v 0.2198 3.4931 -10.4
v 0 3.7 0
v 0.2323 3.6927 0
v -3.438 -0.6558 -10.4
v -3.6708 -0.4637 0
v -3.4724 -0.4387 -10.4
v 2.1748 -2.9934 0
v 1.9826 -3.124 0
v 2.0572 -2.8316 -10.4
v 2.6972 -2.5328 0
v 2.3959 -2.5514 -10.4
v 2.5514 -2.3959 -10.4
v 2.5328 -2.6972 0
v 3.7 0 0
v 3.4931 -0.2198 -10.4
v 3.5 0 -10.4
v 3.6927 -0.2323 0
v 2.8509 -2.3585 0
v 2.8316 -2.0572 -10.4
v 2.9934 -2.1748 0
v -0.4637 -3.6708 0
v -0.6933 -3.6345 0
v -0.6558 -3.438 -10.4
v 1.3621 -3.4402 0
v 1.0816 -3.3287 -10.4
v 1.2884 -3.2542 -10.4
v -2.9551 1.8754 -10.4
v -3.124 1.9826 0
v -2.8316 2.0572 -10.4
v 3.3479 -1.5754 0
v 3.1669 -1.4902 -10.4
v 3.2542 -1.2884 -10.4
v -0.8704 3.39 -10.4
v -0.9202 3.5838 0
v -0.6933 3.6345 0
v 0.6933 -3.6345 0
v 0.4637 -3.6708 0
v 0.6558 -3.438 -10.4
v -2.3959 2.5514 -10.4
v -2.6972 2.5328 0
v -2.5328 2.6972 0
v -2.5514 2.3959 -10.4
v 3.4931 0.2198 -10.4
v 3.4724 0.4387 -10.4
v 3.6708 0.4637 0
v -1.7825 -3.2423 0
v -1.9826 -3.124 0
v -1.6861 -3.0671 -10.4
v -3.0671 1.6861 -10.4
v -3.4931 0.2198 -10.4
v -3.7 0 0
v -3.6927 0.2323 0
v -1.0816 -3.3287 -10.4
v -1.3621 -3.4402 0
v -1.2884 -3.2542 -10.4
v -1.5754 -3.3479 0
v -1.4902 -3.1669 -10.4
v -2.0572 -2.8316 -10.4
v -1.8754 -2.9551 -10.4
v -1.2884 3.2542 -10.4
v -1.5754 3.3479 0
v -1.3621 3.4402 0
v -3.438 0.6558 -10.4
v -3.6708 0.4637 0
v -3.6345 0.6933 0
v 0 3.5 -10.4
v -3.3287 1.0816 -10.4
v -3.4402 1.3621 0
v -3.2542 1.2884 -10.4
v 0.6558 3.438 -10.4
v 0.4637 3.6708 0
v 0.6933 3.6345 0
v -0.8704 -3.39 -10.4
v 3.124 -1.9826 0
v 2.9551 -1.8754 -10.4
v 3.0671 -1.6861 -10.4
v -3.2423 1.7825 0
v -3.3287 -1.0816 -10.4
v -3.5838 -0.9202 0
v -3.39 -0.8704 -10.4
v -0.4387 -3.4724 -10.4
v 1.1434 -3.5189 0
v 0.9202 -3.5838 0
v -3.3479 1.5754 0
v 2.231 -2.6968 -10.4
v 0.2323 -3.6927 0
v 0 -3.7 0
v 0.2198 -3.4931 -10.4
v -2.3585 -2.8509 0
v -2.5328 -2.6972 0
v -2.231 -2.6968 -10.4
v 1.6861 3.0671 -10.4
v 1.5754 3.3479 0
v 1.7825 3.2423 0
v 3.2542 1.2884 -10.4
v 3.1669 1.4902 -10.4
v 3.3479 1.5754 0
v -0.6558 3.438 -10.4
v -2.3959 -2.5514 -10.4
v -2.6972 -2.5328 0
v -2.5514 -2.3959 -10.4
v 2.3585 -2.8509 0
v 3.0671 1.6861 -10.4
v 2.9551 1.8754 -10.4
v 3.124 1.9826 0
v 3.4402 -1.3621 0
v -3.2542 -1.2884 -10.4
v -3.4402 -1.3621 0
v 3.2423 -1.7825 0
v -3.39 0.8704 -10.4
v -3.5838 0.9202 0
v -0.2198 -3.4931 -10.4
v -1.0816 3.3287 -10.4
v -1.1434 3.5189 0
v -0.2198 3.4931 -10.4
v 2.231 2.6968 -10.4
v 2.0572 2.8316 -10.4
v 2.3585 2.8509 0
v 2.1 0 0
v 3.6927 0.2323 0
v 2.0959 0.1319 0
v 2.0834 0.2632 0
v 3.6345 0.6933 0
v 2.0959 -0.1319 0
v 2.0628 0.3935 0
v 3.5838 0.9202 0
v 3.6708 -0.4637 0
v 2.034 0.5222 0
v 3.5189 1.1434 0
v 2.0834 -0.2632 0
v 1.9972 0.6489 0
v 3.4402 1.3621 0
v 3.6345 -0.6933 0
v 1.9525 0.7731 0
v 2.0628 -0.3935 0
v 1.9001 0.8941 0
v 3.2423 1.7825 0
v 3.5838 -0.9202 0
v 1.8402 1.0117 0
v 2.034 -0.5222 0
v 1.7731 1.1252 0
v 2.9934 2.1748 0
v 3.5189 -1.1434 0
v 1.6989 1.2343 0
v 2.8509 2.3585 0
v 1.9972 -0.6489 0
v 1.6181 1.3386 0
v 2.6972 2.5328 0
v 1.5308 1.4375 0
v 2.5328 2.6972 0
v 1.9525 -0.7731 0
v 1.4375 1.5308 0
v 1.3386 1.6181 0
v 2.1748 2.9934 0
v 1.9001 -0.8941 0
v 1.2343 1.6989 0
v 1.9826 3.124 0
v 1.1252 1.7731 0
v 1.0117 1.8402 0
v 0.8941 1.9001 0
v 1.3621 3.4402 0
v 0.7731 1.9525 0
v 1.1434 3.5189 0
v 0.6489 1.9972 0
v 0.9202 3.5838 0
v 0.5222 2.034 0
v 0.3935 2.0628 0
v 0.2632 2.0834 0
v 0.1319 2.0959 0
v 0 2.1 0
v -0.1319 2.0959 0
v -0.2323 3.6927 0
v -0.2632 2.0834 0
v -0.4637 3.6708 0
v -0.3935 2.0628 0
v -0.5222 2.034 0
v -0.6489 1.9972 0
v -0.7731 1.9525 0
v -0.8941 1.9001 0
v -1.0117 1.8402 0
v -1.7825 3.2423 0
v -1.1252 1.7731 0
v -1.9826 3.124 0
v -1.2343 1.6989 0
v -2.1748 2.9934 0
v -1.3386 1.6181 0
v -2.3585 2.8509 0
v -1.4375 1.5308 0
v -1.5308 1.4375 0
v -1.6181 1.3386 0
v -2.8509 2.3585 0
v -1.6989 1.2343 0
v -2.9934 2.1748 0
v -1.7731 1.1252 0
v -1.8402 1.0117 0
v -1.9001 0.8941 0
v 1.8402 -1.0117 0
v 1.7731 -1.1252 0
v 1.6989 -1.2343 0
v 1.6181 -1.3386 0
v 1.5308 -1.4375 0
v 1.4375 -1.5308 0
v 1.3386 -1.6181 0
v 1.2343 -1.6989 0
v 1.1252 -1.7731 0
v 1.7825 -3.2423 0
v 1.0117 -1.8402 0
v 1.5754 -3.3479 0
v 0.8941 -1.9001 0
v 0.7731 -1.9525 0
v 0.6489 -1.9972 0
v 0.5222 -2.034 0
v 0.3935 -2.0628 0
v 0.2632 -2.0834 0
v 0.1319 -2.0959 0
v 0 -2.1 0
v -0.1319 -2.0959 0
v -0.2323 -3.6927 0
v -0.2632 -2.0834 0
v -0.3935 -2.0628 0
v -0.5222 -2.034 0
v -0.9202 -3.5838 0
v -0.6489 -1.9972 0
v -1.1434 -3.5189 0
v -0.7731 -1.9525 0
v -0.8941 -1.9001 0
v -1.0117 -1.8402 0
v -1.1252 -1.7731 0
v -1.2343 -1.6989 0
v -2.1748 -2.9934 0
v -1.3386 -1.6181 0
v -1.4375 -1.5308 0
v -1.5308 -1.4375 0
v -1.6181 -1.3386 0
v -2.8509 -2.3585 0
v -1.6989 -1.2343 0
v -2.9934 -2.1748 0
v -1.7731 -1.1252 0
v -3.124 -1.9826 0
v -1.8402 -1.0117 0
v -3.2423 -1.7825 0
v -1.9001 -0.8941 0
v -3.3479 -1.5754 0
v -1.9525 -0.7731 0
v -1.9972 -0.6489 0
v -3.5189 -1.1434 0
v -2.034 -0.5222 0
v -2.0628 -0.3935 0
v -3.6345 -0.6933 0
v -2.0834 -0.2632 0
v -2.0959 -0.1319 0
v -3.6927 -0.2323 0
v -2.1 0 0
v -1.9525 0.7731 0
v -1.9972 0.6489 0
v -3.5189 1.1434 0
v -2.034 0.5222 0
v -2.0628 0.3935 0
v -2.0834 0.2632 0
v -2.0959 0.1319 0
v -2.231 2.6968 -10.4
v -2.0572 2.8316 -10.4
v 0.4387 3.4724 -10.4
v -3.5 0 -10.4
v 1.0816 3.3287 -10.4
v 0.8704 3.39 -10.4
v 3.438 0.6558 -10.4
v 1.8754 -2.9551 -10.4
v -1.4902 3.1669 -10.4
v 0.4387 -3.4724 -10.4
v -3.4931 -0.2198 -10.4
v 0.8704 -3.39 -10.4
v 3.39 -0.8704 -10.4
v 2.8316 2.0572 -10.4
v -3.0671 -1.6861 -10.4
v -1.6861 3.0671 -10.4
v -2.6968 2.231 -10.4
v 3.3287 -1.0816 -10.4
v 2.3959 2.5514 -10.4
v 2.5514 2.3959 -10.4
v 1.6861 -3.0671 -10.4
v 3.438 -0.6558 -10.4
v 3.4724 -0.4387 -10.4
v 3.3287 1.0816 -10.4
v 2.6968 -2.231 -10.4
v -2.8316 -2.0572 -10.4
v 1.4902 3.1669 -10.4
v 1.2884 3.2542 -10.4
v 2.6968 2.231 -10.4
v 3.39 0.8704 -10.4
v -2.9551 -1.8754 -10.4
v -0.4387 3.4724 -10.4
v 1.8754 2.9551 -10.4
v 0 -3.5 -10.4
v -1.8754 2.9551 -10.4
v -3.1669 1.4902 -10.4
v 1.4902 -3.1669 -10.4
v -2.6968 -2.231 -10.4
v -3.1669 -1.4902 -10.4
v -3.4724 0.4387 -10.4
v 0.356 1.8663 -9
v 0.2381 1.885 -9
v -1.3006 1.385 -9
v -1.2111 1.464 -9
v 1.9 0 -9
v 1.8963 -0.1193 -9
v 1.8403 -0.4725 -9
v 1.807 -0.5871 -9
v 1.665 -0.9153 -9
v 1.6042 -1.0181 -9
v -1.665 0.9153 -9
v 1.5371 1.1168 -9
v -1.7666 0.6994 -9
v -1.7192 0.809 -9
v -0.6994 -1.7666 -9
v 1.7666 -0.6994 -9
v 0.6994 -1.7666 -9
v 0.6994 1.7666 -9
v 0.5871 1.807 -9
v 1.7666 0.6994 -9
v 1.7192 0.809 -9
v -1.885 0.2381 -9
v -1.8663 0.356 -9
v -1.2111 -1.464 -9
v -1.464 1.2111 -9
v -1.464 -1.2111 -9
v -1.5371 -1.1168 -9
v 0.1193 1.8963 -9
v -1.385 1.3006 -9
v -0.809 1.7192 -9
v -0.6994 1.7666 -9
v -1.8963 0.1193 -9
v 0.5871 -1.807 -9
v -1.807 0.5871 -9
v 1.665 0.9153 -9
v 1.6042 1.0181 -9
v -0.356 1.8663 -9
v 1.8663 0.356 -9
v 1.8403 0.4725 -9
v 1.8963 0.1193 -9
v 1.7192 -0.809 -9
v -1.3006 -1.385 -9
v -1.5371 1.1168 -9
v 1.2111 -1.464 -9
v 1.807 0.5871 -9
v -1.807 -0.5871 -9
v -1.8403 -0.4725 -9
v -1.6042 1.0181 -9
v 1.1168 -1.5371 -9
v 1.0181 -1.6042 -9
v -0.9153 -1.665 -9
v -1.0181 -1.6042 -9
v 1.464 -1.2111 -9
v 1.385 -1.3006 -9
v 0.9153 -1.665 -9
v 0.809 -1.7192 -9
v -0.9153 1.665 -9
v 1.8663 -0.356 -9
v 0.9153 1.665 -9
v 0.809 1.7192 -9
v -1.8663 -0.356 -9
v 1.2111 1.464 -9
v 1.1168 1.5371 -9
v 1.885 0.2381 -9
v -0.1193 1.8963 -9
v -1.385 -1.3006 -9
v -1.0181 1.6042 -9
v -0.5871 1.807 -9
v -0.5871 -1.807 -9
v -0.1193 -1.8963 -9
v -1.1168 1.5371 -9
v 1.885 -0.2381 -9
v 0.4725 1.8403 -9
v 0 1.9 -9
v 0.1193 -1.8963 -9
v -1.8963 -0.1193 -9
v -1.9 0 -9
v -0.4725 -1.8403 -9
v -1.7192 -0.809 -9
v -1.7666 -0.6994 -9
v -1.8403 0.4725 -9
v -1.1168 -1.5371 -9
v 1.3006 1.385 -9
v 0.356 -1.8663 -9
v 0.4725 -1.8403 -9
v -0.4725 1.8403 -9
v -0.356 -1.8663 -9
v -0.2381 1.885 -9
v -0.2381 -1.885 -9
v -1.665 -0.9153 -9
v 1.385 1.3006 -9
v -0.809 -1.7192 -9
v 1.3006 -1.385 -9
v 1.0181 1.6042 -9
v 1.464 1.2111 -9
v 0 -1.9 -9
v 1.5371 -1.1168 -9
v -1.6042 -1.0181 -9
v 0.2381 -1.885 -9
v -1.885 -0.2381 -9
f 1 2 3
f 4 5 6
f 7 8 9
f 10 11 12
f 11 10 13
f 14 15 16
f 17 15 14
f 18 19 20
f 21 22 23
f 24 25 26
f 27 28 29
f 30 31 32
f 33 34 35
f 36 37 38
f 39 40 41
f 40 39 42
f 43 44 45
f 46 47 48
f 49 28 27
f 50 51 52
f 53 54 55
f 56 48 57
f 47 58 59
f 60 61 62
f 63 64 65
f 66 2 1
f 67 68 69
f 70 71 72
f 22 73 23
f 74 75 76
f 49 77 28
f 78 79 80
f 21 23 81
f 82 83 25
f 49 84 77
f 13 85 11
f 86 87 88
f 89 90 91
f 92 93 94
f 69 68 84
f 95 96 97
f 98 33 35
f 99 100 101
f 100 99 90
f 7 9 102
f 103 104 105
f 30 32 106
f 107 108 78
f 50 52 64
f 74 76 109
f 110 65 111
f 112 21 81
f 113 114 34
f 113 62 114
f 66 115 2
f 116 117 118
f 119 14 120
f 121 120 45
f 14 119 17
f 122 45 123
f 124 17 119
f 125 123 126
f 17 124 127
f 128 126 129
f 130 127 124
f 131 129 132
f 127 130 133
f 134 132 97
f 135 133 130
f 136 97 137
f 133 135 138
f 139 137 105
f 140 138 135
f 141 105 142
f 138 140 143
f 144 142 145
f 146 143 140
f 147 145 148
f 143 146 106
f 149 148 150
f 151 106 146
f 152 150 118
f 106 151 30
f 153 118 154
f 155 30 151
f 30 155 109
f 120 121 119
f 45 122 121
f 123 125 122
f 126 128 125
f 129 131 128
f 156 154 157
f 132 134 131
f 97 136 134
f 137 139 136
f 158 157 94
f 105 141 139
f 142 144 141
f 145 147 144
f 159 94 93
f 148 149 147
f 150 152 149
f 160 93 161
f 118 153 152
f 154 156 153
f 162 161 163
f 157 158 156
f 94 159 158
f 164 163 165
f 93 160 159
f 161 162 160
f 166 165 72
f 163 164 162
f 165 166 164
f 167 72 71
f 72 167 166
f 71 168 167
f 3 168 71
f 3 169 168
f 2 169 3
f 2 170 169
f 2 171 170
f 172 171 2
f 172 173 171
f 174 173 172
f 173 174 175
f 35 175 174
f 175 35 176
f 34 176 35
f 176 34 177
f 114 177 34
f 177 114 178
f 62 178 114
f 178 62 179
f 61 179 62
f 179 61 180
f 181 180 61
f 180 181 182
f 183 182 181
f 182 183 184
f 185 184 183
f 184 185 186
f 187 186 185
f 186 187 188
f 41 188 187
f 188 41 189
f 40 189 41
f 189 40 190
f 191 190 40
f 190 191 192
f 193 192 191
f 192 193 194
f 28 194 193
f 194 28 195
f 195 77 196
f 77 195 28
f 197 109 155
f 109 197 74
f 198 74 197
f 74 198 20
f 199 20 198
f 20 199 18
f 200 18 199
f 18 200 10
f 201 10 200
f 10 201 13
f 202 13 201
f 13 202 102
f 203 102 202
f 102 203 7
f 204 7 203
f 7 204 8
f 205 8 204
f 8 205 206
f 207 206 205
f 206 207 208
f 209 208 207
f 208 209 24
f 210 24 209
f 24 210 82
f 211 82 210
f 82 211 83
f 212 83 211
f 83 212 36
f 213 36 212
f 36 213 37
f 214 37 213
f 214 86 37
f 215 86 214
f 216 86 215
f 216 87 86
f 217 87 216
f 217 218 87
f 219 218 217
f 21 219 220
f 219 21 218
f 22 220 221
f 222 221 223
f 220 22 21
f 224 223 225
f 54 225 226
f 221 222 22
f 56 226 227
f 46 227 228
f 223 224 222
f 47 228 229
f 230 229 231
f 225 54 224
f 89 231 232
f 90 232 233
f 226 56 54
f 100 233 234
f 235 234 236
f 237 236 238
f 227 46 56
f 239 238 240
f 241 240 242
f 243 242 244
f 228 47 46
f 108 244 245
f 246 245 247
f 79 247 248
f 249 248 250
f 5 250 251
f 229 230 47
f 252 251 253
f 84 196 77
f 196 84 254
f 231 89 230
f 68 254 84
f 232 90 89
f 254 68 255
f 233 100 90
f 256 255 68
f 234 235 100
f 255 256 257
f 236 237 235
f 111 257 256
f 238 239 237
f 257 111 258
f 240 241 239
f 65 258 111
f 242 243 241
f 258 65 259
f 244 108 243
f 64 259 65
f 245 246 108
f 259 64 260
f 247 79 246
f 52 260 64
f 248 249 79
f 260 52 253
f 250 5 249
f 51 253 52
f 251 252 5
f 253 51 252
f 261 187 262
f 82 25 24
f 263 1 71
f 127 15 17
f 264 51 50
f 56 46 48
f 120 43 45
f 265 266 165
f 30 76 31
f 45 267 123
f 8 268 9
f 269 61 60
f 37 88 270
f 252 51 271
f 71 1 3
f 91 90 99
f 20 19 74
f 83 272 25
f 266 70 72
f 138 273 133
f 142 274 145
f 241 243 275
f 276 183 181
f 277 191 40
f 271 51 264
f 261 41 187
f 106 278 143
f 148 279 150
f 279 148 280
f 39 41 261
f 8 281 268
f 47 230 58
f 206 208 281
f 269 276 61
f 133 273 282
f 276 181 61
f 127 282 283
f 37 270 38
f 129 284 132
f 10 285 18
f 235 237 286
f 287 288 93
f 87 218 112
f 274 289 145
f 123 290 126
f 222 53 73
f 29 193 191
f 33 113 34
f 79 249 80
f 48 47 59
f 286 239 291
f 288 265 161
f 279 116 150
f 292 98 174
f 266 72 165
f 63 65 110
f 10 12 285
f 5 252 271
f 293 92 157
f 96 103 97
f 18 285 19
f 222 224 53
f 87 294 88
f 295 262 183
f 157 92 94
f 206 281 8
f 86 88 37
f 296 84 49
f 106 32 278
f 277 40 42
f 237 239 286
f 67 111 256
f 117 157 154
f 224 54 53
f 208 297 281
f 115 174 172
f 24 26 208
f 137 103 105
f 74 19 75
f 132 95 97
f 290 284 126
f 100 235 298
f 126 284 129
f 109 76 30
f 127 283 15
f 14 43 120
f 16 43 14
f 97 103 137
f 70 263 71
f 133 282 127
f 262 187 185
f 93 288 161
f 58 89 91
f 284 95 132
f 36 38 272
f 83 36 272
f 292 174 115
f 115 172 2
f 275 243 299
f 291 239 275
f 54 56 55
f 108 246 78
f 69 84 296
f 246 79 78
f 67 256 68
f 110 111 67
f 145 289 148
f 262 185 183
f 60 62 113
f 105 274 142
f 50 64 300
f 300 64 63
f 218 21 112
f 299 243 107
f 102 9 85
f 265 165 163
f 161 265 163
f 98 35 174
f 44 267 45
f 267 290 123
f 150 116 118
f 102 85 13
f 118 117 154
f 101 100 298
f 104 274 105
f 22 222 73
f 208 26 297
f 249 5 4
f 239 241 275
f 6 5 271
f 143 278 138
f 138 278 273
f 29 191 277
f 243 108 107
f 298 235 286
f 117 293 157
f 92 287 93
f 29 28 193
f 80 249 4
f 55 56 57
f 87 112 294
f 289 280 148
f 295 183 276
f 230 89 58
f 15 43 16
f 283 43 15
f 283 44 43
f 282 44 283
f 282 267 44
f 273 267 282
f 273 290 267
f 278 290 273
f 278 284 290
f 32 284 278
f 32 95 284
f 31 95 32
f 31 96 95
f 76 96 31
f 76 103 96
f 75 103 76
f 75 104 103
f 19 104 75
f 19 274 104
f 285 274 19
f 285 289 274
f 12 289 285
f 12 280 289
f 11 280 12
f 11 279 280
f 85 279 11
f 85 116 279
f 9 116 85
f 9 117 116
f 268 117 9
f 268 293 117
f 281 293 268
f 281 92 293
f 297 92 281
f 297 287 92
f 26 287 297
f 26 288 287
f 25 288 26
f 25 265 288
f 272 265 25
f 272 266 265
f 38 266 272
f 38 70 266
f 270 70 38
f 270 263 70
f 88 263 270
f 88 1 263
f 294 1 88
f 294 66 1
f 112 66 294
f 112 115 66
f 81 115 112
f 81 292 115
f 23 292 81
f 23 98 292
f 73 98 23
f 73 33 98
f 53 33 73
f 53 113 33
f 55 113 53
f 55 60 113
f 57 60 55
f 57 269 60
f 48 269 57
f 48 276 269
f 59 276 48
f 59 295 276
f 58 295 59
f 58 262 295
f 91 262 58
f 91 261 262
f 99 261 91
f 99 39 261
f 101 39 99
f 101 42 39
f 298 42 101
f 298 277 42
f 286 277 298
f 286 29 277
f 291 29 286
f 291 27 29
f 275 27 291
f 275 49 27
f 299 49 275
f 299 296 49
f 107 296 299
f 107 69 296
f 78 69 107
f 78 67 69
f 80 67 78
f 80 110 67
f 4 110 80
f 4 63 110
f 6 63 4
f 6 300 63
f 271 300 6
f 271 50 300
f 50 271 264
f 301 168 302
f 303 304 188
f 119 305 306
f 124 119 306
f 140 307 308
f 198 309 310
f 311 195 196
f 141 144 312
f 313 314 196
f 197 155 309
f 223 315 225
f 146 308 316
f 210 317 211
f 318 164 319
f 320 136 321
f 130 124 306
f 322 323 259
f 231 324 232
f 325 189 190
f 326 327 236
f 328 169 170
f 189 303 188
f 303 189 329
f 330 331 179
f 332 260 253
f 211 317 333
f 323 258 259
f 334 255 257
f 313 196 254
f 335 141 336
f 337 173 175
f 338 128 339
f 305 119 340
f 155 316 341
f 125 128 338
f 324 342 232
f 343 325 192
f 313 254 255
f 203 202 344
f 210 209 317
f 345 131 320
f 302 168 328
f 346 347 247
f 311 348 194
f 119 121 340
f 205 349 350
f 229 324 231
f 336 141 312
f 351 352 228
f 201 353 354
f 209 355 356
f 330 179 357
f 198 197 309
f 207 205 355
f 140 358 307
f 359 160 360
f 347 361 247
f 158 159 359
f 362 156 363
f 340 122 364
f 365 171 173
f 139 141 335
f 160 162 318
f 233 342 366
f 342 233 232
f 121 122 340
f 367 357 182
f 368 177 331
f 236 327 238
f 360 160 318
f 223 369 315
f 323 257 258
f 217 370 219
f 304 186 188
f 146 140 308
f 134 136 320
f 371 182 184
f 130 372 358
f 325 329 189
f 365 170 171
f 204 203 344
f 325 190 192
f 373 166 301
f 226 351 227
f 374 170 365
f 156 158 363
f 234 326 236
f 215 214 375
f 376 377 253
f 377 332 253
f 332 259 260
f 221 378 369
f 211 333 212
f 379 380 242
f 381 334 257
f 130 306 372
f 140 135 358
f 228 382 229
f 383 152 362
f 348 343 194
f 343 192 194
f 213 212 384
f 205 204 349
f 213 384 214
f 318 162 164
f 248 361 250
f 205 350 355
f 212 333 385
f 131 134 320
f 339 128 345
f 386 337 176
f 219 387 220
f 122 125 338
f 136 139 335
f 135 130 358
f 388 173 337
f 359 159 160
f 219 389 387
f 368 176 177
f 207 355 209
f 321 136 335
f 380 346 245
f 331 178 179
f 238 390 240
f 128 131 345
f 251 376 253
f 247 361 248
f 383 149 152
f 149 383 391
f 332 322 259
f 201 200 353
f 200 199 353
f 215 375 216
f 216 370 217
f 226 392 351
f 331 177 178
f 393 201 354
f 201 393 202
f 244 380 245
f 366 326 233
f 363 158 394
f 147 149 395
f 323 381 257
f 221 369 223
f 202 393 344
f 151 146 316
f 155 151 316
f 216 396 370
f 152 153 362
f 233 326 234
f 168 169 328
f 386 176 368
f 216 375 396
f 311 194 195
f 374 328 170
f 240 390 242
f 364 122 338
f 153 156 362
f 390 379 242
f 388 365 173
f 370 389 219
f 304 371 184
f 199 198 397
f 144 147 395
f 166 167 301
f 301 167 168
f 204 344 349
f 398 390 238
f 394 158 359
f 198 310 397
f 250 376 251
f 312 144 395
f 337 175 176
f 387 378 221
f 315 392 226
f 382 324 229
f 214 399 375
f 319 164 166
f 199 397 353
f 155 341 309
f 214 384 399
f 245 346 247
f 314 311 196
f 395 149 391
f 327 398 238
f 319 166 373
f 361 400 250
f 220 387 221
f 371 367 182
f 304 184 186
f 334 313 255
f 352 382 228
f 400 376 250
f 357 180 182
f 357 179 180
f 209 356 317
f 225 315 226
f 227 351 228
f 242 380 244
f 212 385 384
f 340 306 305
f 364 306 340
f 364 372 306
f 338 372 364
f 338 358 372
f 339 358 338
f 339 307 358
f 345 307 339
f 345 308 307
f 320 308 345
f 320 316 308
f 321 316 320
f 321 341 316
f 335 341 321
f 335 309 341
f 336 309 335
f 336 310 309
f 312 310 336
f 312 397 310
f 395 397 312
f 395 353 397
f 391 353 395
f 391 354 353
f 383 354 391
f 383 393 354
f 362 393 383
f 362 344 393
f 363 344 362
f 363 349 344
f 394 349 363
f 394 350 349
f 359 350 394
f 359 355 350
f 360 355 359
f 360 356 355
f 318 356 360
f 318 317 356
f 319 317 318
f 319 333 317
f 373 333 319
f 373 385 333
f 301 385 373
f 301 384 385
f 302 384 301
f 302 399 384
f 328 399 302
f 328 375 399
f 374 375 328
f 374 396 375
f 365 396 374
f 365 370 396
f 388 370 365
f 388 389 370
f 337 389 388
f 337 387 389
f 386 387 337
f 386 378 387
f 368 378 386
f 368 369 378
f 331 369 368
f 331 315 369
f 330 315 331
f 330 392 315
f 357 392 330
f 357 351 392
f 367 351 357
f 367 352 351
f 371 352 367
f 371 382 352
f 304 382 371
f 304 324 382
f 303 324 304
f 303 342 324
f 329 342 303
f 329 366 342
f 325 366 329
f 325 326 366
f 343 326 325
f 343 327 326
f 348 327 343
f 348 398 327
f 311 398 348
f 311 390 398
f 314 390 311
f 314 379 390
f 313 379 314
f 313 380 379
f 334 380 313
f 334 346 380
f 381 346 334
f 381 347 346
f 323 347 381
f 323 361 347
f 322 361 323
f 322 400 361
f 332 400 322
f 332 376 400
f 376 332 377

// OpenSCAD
include <../shared/common.scad>

$fn = 100;

// ----------------------------------------------------------------------------
// MEASUREMENTS

// outer diameter of the bottle tip
tip_d = 4.6;    // [1:0.1:10]

// z-height of the tip
tip_z = 4.0;    // [1:0.1:10]

// ----------------------------------------------------------------------------
// PARAMETERS

// extra z-height of cap, in addition to the tip z-height
cap_extra_z = 5.0;     // [1:0.1:10]

// wall thickness
t = 1.4;               // [1:0.1:10]

// reduce cap radius by this much at the top
r_reduced_top = 0.2;        // [0.0:0.1:2]

// ----------------------------------------------------------------------------
// PARTS

// We are making a hollow cylinder-shaped cap.
cap_z = tip_z + cap_extra_z;
rotate([180, 0, 0]) {
    difference() {
        cylinder(d1=tip_d + 2*t, d2=tip_d + 2 * (t - r_reduced_top), h=cap_z + t);
        cylinder(d1=tip_d - 2*clearance_medium, d2=tip_d + 2 * (- r_reduced_top - clearance_medium), h=cap_z);
    }
}
